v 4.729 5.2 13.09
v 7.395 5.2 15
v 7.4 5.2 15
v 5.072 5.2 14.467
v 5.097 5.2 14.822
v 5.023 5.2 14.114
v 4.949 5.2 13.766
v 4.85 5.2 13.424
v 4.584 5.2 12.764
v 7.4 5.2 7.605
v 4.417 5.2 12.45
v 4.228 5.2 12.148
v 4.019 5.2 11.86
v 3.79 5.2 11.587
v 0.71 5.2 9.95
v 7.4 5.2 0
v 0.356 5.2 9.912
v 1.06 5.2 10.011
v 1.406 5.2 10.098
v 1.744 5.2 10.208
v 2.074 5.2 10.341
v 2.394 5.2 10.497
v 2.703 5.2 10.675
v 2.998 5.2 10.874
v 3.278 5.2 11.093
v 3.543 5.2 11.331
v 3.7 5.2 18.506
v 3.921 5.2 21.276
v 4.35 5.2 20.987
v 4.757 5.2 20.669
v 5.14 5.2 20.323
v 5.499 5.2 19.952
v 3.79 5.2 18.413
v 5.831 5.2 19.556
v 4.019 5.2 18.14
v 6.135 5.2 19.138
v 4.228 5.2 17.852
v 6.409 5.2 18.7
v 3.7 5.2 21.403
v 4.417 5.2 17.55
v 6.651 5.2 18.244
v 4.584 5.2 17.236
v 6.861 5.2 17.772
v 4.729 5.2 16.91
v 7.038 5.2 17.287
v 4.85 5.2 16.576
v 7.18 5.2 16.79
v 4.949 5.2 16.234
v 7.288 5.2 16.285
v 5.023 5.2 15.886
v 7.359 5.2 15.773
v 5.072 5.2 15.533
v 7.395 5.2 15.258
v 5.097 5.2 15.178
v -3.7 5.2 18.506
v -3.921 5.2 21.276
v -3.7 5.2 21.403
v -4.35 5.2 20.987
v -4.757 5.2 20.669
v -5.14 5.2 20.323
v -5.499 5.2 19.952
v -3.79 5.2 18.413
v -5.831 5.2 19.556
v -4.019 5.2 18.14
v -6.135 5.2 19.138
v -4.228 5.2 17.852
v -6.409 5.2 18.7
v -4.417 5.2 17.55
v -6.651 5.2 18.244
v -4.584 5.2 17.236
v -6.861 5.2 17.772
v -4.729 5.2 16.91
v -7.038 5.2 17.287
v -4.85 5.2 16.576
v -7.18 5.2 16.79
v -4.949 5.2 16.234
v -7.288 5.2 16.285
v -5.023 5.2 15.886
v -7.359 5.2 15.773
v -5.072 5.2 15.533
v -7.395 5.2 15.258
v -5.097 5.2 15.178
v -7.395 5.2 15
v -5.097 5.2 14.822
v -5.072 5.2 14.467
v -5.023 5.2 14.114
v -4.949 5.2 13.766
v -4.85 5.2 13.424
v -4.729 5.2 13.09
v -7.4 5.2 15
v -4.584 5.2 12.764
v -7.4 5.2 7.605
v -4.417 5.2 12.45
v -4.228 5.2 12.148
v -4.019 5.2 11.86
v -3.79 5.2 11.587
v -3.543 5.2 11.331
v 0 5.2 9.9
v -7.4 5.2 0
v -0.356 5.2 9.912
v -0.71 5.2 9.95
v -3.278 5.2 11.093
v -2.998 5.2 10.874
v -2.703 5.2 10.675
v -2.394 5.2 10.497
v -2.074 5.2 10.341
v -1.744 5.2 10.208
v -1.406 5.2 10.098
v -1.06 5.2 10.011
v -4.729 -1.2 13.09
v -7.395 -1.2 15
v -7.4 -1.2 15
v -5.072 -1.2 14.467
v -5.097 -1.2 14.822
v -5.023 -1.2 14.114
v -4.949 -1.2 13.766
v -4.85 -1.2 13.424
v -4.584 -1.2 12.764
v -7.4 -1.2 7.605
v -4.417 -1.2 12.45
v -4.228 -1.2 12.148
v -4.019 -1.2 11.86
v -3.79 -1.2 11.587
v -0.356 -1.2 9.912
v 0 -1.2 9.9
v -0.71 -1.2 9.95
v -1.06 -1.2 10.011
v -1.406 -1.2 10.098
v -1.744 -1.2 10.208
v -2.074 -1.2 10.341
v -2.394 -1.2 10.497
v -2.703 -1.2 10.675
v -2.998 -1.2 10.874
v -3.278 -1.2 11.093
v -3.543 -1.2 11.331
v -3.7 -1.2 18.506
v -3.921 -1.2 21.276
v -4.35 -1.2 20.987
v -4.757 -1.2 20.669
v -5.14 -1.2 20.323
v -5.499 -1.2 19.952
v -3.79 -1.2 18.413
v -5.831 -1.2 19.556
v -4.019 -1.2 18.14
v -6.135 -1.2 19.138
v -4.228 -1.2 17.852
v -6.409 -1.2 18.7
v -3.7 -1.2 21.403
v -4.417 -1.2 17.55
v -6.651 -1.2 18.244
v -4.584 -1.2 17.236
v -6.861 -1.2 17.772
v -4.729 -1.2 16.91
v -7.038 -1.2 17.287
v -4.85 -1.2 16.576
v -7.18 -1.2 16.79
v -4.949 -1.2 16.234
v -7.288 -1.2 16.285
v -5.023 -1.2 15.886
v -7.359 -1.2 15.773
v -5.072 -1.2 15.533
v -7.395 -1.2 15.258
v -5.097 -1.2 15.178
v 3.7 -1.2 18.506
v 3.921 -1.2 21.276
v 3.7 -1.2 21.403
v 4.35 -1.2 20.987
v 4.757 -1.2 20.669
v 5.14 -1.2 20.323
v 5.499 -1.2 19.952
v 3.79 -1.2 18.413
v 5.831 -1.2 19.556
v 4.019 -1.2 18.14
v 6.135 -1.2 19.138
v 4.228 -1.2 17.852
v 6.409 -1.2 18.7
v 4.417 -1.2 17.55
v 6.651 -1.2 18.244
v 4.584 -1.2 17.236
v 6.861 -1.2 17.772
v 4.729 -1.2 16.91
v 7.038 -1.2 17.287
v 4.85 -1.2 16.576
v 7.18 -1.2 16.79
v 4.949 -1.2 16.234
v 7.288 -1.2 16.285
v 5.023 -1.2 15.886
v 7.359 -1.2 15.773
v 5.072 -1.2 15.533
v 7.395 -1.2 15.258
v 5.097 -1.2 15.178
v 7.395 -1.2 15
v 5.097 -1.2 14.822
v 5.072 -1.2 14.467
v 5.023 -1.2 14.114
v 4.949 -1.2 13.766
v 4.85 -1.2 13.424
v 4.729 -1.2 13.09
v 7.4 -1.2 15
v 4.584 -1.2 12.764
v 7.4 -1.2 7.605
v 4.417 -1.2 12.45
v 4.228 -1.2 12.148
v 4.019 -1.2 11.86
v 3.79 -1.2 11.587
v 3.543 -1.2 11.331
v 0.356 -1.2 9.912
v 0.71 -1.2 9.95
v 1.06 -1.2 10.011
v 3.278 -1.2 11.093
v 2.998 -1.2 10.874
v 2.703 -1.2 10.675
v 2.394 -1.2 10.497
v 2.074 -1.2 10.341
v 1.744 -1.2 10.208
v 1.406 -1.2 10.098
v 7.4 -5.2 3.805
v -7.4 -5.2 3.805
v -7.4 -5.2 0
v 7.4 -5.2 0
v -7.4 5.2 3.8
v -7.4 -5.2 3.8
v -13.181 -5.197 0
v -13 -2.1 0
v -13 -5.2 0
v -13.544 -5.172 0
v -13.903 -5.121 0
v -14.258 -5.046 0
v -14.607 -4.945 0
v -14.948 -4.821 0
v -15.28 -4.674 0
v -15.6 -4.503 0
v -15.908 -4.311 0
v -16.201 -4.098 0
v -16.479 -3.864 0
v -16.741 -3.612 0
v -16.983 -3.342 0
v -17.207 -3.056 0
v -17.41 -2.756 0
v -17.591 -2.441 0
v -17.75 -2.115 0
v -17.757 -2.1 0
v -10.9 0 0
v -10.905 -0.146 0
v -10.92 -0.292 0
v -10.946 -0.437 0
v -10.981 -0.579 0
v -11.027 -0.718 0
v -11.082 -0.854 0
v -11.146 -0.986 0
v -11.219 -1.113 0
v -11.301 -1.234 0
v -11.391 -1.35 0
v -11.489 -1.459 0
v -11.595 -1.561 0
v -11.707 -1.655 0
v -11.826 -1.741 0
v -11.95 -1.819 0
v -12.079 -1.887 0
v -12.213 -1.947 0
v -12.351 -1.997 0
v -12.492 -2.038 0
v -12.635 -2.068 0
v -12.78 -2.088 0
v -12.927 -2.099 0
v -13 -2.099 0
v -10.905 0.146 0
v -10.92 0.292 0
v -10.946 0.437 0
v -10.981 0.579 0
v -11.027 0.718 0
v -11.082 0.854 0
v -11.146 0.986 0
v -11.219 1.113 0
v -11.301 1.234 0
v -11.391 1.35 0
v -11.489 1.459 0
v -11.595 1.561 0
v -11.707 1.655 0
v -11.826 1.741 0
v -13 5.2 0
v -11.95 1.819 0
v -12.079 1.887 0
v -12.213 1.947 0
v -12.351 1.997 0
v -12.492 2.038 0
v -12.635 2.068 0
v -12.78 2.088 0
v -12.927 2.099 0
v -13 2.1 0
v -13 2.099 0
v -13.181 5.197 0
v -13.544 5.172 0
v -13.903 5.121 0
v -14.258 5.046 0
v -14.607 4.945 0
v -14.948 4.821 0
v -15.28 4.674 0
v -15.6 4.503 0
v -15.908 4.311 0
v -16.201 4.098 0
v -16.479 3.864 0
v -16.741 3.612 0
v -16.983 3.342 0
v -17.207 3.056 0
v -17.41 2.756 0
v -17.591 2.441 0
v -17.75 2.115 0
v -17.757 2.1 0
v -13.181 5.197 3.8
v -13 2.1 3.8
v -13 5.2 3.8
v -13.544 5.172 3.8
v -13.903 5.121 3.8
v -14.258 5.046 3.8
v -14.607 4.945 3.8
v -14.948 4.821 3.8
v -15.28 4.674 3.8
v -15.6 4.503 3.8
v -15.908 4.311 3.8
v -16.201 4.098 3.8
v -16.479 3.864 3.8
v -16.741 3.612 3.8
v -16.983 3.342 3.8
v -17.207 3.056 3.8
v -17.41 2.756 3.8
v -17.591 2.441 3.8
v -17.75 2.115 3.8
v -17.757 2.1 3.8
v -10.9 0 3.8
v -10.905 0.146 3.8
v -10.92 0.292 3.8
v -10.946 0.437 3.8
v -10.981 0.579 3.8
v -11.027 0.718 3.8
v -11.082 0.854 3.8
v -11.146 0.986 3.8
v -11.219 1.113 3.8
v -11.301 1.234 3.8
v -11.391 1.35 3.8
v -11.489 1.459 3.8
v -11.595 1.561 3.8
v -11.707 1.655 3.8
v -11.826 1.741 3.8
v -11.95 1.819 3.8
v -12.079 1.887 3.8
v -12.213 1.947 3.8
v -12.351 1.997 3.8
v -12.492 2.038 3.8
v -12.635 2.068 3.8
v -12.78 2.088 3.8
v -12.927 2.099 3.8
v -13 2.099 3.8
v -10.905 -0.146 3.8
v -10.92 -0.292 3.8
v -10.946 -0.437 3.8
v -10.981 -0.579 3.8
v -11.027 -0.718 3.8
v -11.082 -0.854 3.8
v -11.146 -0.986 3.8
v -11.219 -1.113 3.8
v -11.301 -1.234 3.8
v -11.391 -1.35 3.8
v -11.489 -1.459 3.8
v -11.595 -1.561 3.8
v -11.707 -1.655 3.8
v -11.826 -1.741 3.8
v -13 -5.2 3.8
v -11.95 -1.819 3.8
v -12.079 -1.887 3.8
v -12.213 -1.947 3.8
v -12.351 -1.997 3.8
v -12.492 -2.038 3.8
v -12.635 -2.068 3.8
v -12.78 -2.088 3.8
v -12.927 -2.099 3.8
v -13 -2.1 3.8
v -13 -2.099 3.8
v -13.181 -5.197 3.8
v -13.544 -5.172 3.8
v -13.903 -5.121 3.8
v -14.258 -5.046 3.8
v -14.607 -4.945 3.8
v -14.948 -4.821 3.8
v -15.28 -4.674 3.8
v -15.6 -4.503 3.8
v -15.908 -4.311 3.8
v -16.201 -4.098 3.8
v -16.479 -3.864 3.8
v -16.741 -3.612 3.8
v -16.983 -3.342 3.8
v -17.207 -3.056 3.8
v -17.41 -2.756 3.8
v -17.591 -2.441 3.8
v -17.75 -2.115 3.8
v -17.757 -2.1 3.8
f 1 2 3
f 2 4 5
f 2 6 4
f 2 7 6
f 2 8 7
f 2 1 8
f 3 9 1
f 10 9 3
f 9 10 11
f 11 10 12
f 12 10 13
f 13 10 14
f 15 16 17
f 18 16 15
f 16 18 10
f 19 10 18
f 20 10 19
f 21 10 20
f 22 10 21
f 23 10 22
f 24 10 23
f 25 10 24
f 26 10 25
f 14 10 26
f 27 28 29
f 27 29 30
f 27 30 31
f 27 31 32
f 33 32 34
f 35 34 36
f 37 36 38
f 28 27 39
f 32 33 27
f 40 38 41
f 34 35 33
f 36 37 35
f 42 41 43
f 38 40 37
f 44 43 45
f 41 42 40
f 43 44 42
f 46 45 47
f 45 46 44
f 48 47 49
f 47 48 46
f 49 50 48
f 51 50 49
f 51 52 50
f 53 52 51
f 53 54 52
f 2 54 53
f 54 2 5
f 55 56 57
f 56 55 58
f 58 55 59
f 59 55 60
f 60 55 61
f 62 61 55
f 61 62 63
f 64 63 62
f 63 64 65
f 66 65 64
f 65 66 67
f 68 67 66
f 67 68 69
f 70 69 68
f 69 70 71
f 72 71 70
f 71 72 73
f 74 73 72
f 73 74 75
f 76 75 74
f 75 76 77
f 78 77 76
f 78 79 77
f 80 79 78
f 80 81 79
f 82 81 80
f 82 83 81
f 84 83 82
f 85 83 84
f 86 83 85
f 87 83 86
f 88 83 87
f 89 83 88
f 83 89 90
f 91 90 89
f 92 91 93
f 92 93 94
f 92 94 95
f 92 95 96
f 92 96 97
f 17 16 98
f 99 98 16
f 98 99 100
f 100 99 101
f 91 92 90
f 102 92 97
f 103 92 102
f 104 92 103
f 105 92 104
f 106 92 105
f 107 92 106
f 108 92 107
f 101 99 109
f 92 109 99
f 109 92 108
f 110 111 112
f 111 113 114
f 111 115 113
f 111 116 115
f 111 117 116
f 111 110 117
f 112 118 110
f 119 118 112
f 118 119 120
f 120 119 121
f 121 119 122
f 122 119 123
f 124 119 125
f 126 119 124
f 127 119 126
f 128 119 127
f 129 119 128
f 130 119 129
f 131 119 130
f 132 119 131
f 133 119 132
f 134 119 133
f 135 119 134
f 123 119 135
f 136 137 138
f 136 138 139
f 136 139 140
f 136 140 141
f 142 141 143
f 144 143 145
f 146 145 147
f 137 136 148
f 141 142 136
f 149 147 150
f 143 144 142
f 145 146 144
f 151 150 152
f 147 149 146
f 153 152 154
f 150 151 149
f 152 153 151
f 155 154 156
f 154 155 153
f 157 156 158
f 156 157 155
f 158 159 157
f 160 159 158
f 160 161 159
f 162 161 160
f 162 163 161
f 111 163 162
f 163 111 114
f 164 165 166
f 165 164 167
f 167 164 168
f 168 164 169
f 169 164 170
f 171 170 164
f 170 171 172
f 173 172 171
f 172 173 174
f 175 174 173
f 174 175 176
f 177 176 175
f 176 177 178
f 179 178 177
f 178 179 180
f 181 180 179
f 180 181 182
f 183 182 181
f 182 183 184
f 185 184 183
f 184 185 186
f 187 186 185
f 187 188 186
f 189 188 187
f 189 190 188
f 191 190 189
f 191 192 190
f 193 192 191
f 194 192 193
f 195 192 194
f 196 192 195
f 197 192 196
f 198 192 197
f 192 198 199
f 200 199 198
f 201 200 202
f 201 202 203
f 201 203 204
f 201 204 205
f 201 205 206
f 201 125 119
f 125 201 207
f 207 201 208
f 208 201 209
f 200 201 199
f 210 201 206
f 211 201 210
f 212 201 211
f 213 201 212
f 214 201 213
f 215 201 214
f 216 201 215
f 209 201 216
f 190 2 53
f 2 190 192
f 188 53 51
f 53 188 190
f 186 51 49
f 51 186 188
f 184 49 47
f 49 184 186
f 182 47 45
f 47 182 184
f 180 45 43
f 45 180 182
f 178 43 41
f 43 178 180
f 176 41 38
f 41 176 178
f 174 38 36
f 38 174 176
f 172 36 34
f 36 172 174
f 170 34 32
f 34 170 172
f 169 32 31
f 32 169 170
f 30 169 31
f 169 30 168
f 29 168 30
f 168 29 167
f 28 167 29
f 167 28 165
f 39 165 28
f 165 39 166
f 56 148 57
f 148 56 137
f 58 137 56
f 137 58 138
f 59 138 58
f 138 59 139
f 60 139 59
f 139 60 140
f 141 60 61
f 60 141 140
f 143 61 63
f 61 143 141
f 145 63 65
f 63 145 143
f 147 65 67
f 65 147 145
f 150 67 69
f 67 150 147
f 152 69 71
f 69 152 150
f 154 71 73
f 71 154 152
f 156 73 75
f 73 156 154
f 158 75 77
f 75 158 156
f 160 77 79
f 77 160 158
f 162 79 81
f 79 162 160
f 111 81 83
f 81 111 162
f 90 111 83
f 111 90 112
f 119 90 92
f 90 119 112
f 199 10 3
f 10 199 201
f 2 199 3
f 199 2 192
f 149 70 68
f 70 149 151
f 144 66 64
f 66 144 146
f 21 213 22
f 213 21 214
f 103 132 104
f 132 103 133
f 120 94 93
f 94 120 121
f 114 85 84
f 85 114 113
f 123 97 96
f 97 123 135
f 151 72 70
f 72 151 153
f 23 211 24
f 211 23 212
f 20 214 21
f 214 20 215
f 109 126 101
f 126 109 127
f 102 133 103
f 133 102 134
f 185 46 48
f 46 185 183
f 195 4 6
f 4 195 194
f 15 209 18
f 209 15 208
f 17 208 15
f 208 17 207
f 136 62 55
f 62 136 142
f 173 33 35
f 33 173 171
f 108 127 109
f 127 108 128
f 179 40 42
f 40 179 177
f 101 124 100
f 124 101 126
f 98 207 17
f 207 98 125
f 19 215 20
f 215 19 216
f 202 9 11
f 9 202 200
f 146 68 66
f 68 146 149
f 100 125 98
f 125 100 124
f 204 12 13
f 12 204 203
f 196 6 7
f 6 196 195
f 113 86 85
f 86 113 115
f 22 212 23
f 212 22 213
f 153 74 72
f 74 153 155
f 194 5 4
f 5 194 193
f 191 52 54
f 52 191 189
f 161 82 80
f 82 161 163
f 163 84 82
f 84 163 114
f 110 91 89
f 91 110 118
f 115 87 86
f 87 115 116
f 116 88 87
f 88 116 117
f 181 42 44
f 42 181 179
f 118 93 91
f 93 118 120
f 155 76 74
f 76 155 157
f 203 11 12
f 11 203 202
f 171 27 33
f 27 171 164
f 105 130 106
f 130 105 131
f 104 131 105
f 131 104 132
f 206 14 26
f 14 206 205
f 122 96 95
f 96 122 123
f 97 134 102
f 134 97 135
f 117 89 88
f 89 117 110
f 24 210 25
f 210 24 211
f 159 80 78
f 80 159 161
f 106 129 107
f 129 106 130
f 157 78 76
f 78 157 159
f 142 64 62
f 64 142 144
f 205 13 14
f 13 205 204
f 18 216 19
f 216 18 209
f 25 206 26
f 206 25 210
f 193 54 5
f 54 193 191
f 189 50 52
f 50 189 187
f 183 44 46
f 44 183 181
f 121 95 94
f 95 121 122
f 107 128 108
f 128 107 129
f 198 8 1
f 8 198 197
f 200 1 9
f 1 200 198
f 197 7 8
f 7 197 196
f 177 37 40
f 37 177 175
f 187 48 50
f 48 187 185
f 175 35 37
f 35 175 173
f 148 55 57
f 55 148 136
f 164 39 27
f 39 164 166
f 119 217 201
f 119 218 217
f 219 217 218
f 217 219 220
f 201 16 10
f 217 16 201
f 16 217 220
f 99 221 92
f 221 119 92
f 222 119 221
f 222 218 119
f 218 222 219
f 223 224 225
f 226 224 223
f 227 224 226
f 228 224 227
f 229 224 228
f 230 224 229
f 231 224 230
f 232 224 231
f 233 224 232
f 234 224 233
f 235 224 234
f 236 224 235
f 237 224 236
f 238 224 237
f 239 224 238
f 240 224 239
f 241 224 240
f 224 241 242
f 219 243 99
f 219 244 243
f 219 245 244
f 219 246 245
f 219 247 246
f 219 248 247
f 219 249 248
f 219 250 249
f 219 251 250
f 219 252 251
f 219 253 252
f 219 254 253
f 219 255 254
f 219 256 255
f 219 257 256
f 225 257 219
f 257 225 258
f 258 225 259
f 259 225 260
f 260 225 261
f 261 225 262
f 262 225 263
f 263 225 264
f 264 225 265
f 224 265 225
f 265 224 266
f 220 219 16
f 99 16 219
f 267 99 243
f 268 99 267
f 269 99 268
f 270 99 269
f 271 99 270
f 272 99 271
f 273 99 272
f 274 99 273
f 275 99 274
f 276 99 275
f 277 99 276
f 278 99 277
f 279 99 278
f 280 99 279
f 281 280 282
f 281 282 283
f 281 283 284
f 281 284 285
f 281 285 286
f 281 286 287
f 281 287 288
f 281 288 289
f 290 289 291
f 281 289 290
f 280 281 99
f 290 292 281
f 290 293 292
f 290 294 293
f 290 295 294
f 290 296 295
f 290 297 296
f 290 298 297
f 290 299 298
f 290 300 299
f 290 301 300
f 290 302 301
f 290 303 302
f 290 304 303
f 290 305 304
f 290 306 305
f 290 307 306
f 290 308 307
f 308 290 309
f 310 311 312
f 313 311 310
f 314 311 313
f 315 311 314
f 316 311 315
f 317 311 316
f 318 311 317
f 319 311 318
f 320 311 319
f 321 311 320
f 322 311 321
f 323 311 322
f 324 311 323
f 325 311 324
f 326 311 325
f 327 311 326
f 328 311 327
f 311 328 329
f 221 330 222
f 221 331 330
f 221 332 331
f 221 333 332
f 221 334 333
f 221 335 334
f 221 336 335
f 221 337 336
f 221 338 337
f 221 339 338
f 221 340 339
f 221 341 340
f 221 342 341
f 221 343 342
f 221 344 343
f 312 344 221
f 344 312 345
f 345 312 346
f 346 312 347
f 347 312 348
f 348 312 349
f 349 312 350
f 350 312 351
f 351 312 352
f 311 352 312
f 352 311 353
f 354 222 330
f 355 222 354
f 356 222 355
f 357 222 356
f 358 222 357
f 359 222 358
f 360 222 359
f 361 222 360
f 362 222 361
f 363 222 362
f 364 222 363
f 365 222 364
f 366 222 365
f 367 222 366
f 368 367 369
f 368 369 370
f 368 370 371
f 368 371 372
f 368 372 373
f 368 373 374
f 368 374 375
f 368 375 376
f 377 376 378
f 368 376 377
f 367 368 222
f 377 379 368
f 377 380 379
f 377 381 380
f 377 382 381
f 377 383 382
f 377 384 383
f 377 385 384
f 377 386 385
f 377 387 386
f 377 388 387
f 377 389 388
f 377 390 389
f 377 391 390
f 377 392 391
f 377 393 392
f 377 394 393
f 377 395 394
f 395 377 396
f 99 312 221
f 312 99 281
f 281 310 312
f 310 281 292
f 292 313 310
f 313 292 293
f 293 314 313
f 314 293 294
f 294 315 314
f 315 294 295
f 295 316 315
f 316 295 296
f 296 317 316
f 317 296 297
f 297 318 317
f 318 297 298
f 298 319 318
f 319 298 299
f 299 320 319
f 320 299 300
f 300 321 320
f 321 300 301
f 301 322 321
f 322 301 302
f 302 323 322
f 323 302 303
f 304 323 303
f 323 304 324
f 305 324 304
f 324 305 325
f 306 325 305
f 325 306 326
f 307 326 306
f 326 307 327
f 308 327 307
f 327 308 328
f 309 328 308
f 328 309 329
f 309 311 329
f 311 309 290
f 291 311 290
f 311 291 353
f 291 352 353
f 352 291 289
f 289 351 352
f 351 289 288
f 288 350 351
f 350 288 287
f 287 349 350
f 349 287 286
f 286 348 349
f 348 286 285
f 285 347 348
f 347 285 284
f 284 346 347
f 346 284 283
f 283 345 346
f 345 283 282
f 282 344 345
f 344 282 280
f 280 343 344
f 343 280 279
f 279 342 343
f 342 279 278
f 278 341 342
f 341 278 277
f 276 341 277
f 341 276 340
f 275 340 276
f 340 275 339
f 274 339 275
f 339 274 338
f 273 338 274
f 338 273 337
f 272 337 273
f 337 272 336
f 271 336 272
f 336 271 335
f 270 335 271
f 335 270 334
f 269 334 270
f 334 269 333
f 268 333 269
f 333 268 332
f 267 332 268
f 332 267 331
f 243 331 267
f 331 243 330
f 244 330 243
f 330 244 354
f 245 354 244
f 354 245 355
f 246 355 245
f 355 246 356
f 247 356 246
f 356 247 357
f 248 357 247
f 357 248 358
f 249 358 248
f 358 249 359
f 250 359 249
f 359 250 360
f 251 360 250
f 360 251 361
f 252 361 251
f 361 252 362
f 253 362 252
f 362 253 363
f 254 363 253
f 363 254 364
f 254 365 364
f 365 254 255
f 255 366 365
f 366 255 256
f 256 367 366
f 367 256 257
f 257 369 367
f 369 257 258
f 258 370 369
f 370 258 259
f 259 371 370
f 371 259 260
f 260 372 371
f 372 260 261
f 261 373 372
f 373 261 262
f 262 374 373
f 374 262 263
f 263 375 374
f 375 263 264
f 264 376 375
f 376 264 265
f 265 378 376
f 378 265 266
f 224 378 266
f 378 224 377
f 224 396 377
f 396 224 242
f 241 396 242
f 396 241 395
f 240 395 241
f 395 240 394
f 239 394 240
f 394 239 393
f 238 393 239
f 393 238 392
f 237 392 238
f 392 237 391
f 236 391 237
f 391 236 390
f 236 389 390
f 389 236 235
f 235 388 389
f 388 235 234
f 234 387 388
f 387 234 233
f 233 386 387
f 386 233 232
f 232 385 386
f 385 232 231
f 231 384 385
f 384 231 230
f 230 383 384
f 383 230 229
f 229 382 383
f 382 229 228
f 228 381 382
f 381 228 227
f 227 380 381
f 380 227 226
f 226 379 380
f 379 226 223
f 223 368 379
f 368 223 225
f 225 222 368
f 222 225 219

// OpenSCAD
////CableHolder+spade.scad
////OpenSCAD 2015.03-2
////Kijja Chaovanakij
////2019.10.27

/*[var]*/
//number of fragments[40=low,60=medium,90=high]
$fn=90;
//tolerance[0.2]
tol=0.2;

/*[cable holder var]*/
//holder inner diameter[10]
h_in_dia=10; //[5:0.2:50]
//holder ring width[2.4]
h_ring_wid=2.4; //[1.8:0.2:8]
//holder ring thickness[2.4]
h_ring_thi=6.4;
//holder thickness[2.4]
cus_h_thi=10.4; //[2:0.5:50]
//holder center offset from base[24]
cus_h_offset=15;
//holder rotatation
h_rot=1; //[0:middle,1:top,2:bottom]
//holder split width[2.4]
cus_h_split_wid=7.4;

/*[spade var]*/
//spade inner diameter[4]
s_in_dia=4;
//spade edge width[3.2]
s_edge_wid=3.2;
//spade thickness[1.8]
s_thi=3.8;
//spade center offset from back of holder[12]
cus_s_offset=13;

////translate var
h_out_dia=h_in_dia+h_ring_wid*2;
  echo("h_out_dia=",h_out_dia);
s_out_dia=s_in_dia+s_edge_wid*2;
  echo("s_out_dia=",s_out_dia);
h_offset=max(cus_h_offset,h_out_dia/2+s_thi);
  echo("h_offset=",h_offset);
s_offset=max(cus_s_offset,s_out_dia/2+h_in_dia/2+h_ring_wid);
  echo("s_offset=",s_offset);
min_h_thi=max(cus_h_thi,h_ring_thi/2);
h_thi=min(min_h_thi,s_out_dia);
  echo("h_thi=",h_thi);
h_split_wid=min(h_in_dia,cus_h_split_wid);
  echo("h_split_wid=",h_split_wid);
cham_size=(h_out_dia-s_out_dia)/2;
  echo("cham_size=",cham_size);

////main
if (h_rot==0){
  spade();
  holder();
  linear_extrude(s_thi){
    translate([-h_thi,s_out_dia/2,0])
      rotate([0,0,90])
        chamfer();
    translate([-h_thi,-s_out_dia/2,0])
      rotate([0,0,180])
        chamfer();
  }//l
}//i
if (h_rot==1){
  spade();
  translate([0,s_out_dia/2,0])
    rotate(90)
      holder();
  linear_extrude(s_thi){
    difference(){
      square([h_out_dia,s_out_dia],true);
      translate([h_out_dia/2,-s_out_dia/2,0])
        rotate([0,0,90])
          chamfer();
    }//d
  }//l
}//i
if (h_rot==2){
  spade();
  translate([0,-s_out_dia/2,0])
    rotate(-90)
      holder();
  linear_extrude(s_thi){
    difference(){
      square([h_out_dia,s_out_dia],true);
      translate([h_out_dia/2,s_out_dia/2,0])
        rotate([0,0,180])
          chamfer();
    }//d
  }//l
}//i
//

module spade(){
linear_extrude(s_thi)
difference(){
  hull(){
    translate([-s_offset/2,0,0])
      square([s_offset,s_out_dia],true);
    translate([-s_offset,0,0])
      circle(d=s_out_dia);
  }//h
  translate([-s_offset,0,0])
    circle(d=s_in_dia+tol);
  translate([-(s_offset+s_out_dia/4),0,0])
    square([s_out_dia/2,s_in_dia+tol],true);
}//d
}//m
//

module holder(){
rotate([0,-90,0]){
  color("yellow")
  difference(){
    linear_extrude(h_ring_thi)
      union(){
        translate([h_offset,0,0])
          circle(d=h_out_dia);
        translate([h_offset-h_out_dia/4,0,0])
          square([h_out_dia/2,h_out_dia],true);
      }//u
    translate([h_offset,0,-0.05])
      linear_extrude(h_ring_thi+0.1)
        circle(d=h_in_dia+tol);
    translate([h_offset+h_out_dia/2,0,-0.05])
      linear_extrude(h_ring_thi+0.1)
        square([h_out_dia,h_split_wid],true);
  }//d

  if (h_offset-h_out_dia/2-h_thi<=0){
    color("pink")
    hull(){
      translate([h_offset-h_out_dia/2,0,0])
        linear_extrude(h_ring_thi)
          square([0.01,h_out_dia],true);
      translate([s_thi,0,0])
        linear_extrude(h_thi)
          square([0.01,h_out_dia],true);
    }//h
    translate([s_thi/2,0,0])
      linear_extrude(h_thi)
        square([s_thi,h_out_dia],true);
  }//i

  if (h_offset-h_out_dia/2-h_thi>0){
    color("pink")
    hull(){
      translate([h_offset-h_out_dia/2,0,0])
        linear_extrude(h_ring_thi)
          square([0.01,h_out_dia],true);
      translate([h_offset-h_out_dia/2-h_thi,0,0])
        linear_extrude(h_thi)
          square([0.01,h_out_dia],true);
    }//h
    translate([(h_offset-h_out_dia/2-h_thi)/2,0,0])
      linear_extrude(h_thi)
        square([h_offset-h_out_dia/2-h_thi,h_out_dia],true);
  }//i
}//r
}//m
//

module chamfer(){
difference(){
square([cham_size,cham_size]);
translate([cham_size,cham_size,0])
  circle(d=cham_size*2);
}//d
}//m
